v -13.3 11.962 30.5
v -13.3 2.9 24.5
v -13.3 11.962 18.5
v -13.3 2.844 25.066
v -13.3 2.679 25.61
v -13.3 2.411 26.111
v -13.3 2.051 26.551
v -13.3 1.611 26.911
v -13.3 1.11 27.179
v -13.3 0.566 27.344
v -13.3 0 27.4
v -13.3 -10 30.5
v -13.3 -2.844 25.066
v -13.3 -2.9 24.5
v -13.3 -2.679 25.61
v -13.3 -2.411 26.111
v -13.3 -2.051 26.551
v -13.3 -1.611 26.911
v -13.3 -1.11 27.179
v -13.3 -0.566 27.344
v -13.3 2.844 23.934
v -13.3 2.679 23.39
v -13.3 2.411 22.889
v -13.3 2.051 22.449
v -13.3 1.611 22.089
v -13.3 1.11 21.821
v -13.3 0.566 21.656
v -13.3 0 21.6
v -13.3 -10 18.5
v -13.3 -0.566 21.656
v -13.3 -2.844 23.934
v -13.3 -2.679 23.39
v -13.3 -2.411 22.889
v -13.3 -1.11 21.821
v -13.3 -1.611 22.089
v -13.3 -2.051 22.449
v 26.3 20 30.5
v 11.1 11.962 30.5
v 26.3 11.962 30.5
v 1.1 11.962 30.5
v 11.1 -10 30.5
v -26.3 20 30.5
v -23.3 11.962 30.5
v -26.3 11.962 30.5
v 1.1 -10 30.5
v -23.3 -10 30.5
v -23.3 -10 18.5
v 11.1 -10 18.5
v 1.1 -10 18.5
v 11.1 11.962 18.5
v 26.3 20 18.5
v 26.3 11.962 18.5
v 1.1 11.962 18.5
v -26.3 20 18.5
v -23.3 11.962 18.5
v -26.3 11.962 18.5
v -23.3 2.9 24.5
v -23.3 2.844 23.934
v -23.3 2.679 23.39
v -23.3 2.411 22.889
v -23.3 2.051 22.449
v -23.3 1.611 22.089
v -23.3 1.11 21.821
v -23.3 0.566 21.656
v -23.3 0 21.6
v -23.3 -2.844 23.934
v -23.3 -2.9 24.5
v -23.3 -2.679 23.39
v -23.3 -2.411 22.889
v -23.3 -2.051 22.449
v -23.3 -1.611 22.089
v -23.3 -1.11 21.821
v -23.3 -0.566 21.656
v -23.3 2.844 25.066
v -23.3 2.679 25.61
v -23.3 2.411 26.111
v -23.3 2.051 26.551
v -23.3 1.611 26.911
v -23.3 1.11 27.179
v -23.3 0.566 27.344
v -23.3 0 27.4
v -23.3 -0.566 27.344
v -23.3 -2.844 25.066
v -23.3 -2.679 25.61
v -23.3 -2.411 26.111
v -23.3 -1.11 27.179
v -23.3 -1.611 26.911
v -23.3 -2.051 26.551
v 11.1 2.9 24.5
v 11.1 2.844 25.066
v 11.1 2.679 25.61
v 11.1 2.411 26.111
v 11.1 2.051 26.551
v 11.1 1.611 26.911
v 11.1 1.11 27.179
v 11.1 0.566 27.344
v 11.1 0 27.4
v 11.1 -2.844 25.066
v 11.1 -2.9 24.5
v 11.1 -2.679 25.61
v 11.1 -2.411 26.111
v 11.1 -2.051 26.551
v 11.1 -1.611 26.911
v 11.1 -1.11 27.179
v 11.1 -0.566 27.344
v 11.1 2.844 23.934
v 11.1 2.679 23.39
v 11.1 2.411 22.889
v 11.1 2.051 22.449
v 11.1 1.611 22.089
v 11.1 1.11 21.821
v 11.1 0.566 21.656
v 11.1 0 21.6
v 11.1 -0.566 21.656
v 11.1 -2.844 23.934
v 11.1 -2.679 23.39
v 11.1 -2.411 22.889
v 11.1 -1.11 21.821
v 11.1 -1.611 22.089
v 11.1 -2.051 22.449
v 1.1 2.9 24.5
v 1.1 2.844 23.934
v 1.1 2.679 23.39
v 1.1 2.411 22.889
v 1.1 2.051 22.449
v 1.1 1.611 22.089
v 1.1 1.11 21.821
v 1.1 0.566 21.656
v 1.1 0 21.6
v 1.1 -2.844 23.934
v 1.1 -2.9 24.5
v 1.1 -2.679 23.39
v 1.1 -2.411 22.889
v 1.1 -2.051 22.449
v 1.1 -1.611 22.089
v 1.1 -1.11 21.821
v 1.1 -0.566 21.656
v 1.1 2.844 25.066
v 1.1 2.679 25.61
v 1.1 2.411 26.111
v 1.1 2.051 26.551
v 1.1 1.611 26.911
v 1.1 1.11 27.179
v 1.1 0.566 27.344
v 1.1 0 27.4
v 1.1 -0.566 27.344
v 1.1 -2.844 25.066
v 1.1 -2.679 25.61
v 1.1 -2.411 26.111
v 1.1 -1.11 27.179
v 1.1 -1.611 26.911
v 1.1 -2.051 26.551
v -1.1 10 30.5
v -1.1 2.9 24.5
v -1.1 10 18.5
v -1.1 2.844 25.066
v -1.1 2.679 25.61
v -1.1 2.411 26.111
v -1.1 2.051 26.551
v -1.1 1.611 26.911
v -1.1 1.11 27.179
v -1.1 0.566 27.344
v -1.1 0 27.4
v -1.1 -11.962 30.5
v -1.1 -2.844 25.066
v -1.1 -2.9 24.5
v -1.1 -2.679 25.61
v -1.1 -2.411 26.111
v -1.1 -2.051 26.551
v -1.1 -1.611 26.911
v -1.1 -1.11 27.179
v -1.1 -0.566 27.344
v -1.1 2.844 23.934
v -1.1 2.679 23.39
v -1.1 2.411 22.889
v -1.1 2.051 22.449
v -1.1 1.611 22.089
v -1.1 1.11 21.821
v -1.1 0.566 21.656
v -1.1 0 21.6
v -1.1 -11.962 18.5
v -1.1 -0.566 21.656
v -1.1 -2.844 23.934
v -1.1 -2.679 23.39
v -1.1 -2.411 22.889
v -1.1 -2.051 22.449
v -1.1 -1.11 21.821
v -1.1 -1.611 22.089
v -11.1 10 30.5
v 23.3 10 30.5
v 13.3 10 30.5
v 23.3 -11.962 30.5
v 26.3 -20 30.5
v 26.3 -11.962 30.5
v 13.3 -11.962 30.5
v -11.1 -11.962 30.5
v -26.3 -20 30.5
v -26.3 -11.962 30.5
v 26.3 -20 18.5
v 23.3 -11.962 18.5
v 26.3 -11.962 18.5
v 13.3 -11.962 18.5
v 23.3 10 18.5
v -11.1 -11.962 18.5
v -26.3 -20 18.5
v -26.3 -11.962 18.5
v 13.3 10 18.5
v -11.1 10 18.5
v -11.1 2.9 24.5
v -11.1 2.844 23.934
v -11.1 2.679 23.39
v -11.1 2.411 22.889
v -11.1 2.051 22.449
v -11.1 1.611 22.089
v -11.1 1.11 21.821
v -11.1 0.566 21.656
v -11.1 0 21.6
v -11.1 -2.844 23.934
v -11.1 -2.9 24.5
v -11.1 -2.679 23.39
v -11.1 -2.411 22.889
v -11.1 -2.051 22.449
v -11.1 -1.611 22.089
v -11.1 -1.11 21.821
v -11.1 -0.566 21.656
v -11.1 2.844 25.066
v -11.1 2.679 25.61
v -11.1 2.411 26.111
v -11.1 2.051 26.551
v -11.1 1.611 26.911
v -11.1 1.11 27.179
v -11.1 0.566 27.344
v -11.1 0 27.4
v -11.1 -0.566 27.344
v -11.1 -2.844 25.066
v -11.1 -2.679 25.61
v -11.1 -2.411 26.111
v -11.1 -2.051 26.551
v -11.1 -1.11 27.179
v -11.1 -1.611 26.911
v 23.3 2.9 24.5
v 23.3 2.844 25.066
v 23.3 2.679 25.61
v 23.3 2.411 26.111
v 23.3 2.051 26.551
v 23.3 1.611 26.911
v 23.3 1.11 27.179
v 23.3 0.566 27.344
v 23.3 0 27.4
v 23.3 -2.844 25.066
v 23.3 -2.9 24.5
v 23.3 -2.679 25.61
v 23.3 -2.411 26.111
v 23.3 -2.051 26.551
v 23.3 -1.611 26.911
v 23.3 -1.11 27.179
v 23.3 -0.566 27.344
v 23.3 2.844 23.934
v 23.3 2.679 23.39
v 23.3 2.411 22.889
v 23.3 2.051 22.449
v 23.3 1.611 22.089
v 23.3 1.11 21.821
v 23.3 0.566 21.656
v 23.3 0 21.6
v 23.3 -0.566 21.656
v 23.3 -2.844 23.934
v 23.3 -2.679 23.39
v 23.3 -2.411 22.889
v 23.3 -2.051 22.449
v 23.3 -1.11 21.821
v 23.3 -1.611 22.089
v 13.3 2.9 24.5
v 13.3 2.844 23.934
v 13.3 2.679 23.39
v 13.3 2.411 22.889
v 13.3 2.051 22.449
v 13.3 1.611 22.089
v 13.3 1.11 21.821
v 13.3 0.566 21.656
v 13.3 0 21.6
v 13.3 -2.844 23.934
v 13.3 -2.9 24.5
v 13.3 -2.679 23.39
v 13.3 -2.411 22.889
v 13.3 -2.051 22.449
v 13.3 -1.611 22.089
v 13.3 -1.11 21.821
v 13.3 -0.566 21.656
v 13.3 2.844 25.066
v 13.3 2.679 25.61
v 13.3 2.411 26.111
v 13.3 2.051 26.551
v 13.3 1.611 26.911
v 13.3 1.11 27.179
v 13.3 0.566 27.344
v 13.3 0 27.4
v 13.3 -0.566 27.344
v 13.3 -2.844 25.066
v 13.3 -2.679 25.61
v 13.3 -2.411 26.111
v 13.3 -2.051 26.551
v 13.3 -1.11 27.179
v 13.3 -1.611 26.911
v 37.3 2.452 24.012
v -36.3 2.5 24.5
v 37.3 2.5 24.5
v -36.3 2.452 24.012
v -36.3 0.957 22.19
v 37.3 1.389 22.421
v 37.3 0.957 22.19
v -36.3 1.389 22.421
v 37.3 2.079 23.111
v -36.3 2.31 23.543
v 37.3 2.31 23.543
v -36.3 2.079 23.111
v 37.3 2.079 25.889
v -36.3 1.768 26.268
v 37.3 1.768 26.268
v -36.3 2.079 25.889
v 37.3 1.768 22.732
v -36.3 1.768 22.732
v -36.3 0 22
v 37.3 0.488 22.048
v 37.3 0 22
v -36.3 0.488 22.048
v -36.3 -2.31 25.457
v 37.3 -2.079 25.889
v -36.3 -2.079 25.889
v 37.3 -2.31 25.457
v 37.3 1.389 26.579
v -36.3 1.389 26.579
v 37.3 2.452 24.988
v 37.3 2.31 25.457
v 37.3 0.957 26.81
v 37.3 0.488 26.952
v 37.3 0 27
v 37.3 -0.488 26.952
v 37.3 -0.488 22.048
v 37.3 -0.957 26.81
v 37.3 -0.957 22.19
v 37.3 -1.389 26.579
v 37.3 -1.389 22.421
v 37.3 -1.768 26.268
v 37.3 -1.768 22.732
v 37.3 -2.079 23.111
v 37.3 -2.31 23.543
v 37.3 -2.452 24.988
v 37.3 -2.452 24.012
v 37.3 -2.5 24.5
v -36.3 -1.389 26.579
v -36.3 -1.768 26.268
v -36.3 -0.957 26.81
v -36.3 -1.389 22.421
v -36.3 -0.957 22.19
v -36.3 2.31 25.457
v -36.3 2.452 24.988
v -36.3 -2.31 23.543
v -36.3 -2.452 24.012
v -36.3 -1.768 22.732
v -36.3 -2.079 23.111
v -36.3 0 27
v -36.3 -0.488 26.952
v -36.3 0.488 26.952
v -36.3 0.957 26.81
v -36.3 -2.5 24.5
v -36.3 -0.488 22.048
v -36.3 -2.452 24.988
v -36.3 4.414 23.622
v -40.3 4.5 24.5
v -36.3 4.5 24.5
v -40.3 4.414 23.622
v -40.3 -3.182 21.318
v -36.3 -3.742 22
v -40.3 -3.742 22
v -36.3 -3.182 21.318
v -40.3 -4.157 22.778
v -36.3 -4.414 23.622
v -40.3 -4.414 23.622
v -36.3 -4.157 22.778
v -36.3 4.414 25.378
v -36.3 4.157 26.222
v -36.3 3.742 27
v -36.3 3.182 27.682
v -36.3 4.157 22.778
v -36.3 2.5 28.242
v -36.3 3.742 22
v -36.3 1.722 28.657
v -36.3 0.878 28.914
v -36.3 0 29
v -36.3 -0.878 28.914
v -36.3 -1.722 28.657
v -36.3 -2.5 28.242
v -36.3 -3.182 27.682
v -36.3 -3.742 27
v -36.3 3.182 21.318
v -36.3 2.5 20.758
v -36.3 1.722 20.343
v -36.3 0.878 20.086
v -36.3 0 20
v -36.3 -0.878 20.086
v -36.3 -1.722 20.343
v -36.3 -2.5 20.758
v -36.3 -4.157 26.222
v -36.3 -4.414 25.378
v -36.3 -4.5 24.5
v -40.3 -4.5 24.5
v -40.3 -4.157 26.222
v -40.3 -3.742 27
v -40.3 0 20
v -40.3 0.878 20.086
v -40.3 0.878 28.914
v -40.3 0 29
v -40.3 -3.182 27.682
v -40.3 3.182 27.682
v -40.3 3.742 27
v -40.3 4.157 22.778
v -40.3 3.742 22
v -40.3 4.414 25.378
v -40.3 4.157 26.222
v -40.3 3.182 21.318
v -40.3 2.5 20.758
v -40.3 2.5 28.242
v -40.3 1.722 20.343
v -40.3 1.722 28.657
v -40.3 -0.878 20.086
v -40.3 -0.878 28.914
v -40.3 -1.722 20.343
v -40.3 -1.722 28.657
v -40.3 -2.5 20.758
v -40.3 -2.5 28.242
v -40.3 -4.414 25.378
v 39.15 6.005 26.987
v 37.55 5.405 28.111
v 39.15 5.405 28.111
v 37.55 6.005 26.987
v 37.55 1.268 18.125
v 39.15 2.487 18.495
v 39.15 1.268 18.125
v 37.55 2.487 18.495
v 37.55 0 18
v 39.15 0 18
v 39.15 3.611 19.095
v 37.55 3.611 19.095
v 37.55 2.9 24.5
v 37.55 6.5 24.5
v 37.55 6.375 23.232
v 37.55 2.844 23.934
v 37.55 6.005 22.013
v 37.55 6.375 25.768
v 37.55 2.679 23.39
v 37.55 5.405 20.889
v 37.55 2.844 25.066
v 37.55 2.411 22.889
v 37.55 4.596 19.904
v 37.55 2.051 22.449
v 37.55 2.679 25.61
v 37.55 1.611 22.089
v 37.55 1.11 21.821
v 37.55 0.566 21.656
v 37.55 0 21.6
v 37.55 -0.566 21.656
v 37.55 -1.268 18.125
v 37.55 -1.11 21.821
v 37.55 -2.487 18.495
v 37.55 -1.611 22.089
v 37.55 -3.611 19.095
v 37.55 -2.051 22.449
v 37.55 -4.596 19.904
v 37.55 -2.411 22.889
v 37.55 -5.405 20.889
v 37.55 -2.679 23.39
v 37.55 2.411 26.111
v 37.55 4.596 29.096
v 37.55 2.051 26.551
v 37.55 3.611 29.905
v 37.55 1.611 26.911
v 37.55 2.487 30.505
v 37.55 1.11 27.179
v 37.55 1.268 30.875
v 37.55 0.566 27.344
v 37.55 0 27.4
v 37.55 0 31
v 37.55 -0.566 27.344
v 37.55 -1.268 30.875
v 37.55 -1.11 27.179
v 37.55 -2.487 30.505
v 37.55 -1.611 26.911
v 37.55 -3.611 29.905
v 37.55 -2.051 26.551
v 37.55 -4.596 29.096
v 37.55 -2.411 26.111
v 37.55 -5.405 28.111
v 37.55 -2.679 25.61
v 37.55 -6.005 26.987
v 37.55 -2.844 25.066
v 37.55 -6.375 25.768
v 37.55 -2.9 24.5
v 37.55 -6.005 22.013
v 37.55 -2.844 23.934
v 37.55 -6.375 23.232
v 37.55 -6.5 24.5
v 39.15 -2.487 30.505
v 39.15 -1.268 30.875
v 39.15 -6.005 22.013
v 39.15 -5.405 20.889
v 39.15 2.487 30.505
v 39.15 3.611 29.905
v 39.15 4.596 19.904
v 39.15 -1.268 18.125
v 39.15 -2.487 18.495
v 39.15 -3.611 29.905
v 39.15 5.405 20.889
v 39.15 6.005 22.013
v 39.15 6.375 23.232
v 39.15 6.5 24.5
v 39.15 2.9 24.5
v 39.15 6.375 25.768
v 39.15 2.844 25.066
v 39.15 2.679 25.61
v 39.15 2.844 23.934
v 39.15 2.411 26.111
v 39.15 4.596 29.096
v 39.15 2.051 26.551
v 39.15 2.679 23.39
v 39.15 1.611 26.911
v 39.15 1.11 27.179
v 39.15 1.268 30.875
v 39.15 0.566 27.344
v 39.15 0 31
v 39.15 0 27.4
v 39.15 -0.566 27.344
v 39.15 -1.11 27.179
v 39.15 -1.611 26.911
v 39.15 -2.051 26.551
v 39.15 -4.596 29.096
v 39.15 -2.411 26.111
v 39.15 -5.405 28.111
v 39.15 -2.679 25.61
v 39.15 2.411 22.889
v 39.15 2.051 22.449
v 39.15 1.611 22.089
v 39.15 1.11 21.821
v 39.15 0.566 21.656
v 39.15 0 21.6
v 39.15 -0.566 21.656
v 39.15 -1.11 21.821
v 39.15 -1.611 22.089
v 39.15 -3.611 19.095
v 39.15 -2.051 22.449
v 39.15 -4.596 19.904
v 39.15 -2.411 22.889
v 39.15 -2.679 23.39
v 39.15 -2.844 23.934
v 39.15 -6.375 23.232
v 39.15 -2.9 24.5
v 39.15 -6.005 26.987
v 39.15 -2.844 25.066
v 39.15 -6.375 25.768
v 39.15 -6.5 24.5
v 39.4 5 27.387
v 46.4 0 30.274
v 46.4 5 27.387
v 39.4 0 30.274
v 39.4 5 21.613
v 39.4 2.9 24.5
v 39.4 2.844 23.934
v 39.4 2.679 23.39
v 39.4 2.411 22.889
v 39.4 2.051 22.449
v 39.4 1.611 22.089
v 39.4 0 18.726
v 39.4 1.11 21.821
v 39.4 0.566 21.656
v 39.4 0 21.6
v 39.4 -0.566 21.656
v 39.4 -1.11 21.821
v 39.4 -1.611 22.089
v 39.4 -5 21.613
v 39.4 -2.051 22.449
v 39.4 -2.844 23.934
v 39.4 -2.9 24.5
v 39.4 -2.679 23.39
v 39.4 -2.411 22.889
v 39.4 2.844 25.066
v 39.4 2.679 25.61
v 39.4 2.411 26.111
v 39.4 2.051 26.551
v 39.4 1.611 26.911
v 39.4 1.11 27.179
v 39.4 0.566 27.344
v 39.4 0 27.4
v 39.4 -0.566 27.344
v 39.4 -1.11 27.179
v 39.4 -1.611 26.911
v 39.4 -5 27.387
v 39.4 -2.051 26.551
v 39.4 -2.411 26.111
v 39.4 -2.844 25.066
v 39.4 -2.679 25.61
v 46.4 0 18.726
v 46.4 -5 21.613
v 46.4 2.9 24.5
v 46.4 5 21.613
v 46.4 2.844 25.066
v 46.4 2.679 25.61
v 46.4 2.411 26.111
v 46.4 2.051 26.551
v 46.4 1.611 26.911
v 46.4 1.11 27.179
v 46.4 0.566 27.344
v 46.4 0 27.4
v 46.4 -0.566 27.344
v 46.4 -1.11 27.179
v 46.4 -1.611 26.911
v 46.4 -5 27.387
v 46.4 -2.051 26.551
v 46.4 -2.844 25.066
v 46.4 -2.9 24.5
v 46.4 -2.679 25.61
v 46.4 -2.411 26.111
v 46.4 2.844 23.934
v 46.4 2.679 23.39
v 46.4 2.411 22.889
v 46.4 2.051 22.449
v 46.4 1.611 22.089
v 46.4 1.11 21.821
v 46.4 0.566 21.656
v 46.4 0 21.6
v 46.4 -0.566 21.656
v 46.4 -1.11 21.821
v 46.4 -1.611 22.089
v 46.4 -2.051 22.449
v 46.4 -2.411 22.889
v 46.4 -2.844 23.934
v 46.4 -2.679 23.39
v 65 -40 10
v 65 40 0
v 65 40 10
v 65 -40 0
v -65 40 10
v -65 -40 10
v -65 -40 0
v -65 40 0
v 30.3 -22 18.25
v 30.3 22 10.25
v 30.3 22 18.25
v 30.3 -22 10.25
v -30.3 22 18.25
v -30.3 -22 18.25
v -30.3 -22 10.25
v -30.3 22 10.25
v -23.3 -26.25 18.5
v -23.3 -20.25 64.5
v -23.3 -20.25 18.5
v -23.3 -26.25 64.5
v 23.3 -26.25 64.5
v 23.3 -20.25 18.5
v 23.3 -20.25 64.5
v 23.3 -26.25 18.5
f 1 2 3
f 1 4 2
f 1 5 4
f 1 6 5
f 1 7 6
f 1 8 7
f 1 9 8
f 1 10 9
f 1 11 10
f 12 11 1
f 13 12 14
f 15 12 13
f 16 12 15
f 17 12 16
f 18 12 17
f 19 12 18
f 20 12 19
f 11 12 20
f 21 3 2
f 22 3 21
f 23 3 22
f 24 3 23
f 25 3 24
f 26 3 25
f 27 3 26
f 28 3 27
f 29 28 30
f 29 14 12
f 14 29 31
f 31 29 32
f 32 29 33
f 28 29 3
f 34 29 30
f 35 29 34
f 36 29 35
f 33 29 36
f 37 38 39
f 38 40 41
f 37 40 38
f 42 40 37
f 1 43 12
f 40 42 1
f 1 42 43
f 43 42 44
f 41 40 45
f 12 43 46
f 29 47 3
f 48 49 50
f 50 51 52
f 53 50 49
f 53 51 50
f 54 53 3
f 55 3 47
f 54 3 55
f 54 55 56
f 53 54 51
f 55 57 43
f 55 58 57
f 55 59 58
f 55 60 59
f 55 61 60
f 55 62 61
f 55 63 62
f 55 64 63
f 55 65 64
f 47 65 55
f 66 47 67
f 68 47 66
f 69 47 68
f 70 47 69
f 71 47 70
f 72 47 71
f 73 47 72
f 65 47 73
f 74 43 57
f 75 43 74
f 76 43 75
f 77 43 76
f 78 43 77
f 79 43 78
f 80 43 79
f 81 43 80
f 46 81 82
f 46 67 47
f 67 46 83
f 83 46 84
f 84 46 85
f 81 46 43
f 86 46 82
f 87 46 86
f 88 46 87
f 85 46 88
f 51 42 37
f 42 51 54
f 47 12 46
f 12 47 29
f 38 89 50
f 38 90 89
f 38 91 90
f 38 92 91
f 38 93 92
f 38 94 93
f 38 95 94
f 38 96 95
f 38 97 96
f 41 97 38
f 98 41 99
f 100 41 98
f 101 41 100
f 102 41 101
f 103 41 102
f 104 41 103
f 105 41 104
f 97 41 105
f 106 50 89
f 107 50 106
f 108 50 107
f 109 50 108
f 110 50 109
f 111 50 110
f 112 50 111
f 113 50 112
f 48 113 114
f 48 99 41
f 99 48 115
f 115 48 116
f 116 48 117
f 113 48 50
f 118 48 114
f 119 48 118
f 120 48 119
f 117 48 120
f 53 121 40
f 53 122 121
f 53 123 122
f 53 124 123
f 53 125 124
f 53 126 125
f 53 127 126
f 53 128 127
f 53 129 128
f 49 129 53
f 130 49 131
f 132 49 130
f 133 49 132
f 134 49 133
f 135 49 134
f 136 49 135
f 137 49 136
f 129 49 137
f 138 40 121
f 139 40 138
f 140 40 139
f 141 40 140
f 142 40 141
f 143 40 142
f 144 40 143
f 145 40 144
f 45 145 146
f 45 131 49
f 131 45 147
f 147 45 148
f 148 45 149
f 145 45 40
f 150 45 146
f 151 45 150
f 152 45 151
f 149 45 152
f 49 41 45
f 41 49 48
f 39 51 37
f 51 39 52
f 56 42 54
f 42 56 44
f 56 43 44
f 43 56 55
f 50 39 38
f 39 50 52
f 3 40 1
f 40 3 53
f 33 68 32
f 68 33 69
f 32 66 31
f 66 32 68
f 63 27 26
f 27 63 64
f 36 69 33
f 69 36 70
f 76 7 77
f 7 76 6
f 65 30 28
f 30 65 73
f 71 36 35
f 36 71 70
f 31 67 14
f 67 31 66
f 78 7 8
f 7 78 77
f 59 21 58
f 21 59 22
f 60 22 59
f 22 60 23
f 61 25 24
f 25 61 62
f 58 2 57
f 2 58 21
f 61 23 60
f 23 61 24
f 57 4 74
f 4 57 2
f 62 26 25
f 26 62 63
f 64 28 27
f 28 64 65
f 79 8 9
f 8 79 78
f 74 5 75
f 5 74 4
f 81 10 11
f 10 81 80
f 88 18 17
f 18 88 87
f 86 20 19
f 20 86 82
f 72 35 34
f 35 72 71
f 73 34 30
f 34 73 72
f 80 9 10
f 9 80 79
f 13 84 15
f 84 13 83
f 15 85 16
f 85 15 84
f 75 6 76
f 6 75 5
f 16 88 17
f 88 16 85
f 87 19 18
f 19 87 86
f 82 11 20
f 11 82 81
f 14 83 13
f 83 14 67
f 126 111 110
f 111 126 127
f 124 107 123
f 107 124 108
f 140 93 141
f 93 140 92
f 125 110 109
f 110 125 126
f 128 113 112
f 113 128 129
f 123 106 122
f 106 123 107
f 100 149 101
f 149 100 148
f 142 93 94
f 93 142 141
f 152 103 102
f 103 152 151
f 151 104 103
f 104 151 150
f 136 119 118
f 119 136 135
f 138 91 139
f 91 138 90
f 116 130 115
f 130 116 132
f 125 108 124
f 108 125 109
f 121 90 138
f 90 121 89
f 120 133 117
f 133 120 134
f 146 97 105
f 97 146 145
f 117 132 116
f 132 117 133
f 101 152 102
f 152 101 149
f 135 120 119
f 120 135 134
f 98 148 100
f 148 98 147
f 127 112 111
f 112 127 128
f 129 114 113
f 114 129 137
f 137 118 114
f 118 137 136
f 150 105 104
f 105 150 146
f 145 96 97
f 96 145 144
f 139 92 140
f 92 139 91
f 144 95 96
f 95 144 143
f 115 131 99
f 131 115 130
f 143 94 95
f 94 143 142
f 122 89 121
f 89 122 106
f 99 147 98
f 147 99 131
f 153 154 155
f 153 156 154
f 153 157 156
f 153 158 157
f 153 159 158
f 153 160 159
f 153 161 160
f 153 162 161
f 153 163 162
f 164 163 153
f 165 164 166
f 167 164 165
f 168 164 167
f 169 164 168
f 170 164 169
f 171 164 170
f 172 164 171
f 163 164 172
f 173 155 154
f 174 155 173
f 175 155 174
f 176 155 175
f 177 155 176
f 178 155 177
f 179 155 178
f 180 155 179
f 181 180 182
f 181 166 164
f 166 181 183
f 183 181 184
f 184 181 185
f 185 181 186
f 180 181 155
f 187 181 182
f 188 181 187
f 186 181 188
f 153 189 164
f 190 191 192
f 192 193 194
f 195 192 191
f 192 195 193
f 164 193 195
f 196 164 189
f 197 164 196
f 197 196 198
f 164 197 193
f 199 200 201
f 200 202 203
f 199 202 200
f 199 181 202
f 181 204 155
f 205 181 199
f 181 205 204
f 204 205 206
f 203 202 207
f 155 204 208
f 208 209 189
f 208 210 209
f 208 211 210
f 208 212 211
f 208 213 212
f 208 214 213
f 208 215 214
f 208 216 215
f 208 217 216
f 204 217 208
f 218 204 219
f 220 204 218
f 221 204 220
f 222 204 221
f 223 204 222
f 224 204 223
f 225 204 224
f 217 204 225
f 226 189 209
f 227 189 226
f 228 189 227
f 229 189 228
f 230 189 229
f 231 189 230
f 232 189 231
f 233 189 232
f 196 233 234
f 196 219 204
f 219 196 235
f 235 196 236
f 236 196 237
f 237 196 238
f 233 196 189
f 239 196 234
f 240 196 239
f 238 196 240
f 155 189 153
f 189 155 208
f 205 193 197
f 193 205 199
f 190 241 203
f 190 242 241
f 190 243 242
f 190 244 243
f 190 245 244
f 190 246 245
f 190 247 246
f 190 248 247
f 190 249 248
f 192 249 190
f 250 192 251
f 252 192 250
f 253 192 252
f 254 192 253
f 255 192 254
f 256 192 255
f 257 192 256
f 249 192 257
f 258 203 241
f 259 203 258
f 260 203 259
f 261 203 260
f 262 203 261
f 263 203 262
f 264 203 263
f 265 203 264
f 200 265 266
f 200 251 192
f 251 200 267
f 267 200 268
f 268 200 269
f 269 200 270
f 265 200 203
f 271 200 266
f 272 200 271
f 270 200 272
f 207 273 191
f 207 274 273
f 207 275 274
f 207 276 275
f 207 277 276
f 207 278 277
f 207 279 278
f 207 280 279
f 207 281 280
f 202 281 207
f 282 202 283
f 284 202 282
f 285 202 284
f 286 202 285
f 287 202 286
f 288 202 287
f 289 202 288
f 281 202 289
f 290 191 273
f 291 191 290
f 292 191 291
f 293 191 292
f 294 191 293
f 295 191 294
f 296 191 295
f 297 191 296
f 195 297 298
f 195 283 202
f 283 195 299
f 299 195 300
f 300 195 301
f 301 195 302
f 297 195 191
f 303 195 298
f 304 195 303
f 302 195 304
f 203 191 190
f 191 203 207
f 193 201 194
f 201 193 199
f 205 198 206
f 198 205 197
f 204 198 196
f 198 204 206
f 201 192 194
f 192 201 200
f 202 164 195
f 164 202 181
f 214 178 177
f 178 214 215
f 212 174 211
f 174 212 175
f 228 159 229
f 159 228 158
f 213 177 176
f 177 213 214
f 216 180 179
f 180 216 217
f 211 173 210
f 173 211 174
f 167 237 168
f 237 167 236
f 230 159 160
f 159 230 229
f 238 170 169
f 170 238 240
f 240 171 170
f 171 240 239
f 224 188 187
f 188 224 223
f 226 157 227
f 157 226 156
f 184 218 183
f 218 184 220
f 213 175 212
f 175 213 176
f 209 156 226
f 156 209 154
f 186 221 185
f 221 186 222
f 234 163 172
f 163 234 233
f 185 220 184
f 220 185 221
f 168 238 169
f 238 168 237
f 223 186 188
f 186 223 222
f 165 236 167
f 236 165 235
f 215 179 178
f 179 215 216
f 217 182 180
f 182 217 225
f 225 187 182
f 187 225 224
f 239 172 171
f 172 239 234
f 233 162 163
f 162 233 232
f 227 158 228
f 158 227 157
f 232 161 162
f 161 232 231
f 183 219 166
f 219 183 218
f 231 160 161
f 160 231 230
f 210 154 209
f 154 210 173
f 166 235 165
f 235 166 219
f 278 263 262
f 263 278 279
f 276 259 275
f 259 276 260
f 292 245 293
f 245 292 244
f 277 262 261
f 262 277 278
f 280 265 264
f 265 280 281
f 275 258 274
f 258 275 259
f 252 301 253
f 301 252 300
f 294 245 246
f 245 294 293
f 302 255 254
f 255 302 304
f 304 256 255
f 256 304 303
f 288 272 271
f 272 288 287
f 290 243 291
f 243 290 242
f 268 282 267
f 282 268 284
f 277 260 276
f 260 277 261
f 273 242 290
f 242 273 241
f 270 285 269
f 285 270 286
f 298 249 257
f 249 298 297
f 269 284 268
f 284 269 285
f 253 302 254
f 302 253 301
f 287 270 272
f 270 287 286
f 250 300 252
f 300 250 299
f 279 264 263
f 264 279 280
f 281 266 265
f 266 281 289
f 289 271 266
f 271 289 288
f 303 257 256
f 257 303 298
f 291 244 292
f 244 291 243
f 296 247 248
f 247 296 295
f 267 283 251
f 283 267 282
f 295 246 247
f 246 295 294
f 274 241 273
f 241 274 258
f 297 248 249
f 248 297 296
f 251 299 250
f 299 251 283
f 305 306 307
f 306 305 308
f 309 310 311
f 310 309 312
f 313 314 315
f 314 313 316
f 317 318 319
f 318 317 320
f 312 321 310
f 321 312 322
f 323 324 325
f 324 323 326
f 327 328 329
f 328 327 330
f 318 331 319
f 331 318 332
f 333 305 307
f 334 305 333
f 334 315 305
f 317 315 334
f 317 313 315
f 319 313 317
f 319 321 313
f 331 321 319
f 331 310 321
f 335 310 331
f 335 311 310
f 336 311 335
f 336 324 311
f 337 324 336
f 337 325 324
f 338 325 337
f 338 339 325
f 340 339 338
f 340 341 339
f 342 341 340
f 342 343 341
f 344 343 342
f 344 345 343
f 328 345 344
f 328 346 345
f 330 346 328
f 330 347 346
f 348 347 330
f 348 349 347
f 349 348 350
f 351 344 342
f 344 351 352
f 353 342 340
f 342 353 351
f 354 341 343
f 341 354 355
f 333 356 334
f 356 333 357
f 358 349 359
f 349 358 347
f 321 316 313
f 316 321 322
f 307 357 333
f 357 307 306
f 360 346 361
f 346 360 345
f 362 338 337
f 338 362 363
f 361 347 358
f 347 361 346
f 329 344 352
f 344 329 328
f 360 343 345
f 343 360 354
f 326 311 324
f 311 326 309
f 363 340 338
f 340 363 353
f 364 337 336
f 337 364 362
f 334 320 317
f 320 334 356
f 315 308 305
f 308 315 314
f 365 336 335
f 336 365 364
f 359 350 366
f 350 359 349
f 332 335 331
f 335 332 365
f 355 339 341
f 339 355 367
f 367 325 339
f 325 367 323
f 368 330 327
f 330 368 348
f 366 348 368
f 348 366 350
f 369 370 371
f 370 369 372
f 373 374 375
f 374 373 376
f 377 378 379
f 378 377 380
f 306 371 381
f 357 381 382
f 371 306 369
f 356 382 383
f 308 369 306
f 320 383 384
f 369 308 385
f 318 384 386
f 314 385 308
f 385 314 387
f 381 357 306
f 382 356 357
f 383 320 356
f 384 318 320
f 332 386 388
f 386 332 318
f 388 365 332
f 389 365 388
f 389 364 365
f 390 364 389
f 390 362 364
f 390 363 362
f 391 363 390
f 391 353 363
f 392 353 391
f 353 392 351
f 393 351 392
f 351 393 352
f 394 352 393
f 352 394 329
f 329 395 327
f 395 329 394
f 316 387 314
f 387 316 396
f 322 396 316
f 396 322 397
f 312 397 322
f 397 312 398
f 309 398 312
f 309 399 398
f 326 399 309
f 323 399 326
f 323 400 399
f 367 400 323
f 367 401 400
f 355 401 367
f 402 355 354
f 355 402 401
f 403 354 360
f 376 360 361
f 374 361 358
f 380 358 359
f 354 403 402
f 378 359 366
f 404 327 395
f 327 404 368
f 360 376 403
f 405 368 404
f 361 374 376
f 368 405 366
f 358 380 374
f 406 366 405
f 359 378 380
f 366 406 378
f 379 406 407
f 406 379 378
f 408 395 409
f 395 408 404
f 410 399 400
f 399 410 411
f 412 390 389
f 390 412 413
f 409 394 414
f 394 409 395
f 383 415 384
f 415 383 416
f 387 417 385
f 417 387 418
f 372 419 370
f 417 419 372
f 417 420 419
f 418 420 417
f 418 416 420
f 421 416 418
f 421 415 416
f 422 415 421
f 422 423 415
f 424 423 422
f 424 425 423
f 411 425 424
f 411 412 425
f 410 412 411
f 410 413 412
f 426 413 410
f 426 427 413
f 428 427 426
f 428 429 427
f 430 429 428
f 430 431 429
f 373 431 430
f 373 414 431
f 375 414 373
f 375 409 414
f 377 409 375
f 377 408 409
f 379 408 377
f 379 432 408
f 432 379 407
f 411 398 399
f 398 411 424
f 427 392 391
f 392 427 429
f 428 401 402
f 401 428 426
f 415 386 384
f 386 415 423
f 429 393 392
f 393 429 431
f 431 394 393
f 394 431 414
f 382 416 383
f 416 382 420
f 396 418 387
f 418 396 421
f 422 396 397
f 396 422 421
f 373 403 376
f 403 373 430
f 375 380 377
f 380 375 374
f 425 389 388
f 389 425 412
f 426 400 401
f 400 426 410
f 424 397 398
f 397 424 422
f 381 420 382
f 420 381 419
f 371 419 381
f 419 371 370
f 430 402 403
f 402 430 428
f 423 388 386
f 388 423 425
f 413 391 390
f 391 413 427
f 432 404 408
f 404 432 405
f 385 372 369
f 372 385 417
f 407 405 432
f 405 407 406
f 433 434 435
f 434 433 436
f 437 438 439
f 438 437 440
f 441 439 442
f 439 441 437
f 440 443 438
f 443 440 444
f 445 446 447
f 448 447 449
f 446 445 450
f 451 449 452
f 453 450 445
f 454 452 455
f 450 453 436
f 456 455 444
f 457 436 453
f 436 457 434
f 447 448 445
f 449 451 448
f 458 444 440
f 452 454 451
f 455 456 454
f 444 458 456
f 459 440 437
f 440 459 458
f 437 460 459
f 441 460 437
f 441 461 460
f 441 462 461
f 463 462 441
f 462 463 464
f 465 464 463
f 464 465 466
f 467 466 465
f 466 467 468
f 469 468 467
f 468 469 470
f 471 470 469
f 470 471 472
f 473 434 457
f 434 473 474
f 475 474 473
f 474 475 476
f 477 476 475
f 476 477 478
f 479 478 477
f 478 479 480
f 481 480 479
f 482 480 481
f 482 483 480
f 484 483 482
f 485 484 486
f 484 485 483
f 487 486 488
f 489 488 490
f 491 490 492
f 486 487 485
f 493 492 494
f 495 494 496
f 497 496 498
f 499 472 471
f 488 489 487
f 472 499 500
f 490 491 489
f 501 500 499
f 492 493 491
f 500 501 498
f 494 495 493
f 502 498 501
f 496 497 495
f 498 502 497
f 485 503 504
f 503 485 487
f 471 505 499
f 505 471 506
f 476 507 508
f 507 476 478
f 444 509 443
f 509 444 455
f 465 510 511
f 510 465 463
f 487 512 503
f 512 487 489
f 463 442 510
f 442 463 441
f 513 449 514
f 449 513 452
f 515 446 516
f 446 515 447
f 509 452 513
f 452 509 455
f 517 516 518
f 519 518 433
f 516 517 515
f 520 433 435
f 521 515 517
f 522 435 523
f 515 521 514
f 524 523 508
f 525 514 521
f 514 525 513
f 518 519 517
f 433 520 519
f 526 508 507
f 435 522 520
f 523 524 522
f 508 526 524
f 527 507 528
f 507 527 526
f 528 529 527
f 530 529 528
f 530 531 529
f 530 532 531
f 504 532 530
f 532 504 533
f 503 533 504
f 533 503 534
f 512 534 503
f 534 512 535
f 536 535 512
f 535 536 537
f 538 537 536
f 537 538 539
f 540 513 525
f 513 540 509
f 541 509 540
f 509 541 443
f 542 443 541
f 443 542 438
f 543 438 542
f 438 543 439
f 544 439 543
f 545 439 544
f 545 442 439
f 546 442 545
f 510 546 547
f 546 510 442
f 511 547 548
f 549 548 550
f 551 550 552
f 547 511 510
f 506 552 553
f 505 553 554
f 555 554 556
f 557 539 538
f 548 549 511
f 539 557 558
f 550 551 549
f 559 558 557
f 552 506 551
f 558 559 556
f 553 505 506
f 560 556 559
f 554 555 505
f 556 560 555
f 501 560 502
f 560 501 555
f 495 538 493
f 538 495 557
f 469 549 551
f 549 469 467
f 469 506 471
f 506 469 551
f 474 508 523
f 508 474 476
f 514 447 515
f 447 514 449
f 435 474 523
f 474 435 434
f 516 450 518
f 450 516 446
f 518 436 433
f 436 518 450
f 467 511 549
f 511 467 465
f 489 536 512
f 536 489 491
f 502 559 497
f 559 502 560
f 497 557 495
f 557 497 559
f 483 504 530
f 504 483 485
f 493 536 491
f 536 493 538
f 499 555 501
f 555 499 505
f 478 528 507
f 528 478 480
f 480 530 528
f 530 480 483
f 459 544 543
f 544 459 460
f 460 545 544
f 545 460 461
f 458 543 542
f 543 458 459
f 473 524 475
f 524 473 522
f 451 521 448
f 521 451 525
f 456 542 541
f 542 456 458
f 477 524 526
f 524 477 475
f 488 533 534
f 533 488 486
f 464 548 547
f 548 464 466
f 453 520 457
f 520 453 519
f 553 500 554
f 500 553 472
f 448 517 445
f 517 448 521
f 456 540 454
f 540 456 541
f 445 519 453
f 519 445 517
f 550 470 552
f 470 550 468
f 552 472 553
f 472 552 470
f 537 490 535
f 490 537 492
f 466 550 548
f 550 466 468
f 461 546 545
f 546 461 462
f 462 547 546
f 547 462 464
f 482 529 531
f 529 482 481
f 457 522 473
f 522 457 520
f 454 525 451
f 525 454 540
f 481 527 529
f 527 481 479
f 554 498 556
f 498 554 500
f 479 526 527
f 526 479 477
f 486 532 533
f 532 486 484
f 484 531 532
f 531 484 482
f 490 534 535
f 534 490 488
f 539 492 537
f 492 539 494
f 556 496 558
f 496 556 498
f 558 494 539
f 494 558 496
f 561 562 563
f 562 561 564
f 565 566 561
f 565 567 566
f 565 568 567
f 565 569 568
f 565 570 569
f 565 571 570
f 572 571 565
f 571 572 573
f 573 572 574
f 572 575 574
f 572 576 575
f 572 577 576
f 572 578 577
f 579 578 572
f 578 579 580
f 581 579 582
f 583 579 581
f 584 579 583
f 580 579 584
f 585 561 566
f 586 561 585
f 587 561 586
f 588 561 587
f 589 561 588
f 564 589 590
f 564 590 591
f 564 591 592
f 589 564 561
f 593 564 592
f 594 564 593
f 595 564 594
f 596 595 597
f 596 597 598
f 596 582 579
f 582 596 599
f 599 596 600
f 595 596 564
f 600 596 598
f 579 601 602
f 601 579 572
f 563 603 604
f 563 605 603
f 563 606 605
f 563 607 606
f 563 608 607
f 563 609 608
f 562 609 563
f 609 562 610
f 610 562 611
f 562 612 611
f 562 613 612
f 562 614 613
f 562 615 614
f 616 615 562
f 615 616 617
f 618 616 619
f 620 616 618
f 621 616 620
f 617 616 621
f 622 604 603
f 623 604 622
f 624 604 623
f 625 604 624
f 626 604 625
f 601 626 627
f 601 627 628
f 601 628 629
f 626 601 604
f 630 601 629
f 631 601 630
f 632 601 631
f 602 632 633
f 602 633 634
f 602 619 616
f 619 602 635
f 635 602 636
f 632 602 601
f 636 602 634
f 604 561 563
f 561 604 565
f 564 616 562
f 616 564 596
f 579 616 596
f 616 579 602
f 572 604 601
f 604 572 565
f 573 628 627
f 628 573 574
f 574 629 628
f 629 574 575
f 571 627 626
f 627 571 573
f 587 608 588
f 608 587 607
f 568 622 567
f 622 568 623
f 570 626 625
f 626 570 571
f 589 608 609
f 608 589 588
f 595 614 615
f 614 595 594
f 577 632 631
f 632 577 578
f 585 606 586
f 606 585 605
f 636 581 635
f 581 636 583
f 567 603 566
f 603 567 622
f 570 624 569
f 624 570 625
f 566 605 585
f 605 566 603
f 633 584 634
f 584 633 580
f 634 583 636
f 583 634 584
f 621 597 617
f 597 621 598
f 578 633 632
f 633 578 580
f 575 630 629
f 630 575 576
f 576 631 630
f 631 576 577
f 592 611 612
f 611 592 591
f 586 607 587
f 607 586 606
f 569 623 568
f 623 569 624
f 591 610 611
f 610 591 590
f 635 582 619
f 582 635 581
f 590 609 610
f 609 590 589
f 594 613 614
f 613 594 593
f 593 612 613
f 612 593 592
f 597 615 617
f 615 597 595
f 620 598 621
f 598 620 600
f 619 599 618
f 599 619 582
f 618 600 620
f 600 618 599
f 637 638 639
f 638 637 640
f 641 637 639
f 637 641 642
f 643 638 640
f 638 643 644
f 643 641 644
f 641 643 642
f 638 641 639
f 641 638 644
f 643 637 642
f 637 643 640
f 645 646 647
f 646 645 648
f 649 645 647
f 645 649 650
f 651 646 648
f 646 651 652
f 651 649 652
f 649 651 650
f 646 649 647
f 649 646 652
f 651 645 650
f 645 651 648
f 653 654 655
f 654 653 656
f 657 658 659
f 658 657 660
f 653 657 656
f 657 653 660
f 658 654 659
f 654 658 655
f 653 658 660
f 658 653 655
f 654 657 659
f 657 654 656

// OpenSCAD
$fn = 32;

// ------------------------------------------------------------------------
// Comb hinge with flap: leaf 52.6 x 20 mm, pin d5, flap 46 mm
// Every part is its own module, assembly() places every instance.
// ------------------------------------------------------------------------

// --- part 1 ---
module hinge_bed() {
  difference() {
    translate([-65, -40, 0]) cube([130, 80, 10]);
  }
}

// --- part 2 ---
module hinge_riser() {
  difference() {
    translate([-30.3, -22, 0]) cube([60.6, 44, 8]);
  }
}

// --- part 3 ---
module hinge_leaf_a() {
  difference() {
    union() {
      translate([-23.3, -10, -6]) cube([10, 30, 12]);
      translate([1.1, -10, -6]) cube([10, 30, 12]);
      translate([-26.3, 11.962, -6]) cube([52.6, 8.038, 12]);
    }
    translate([-18.3, 0, 0]) rotate([0, 90, 0]) cylinder(h = 12, d = 5.8, center = true);
    translate([6.1, 0, 0]) rotate([0, 90, 0]) cylinder(h = 12, d = 5.8, center = true);
  }
}

// --- part 4 ---
module hinge_leaf_b() {
  difference() {
    union() {
      translate([-11.1, -20, -6]) cube([10, 30, 12]);
      translate([13.3, -20, -6]) cube([10, 30, 12]);
      translate([-26.3, -20, -6]) cube([52.6, 8.038, 12]);
    }
    translate([-6.1, 0, 0]) rotate([0, 90, 0]) cylinder(h = 12, d = 5.8, center = true);
    translate([18.3, 0, 0]) rotate([0, 90, 0]) cylinder(h = 12, d = 5.8, center = true);
  }
}

// --- part 5 ---
module hinge_flap() {
  difference() {
    translate([-23.3, -23, 0]) cube([46.6, 46, 6]);
  }
}

// --- part 6 ---
module hinge_pin() {
  rotate([0, 90, 0]) cylinder(h = 74.6, d = 5, center = true);
  translate([-40.3, 0, 0]) rotate([0, 90, 0]) cylinder(h = 4, d = 9);
}

// --- part 7 ---
module pin_washer() {
  difference() {
      translate([0, 0, 0]) cylinder(h = 1.6, d = 13);
      translate([0, 0, -1]) cylinder(h = 3.6, d = 5.8);
    }
}

// --- part 8 ---
module pin_nut() {
  difference() {
    linear_extrude(height = 7) polygon(points = [[5.774, 0], [2.887, 5], [-2.887, 5], [-5.774, 0], [-2.887, -5], [2.887, -5]]);
    translate([0, 0, -1]) cylinder(h = 9, d = 5.8);
  }
}

// --- assembly ---
module assembly() {
  color([0.80, 0.24, 0.20]) translate([0, 0, 0]) rotate([0, 0, 0]) hinge_bed();
  color([0.20, 0.45, 0.75]) translate([0, 0, 10.25]) rotate([0, 0, 0]) hinge_riser();
  color([0.25, 0.62, 0.32]) translate([0, 0, 24.5]) rotate([0, 0, 0]) hinge_leaf_a();
  color([0.92, 0.70, 0.18]) translate([0, 0, 24.5]) rotate([0, 0, 0]) hinge_leaf_b();
  color([0.58, 0.35, 0.70]) translate([0, -20.25, 41.5]) rotate([90, 0, 0]) hinge_flap();
  color([0.16, 0.66, 0.66]) translate([0, 0, 24.5]) rotate([0, 0, 0]) hinge_pin();
  color([0.85, 0.48, 0.18]) translate([37.55, 0, 24.5]) rotate([0, 90, 0]) pin_washer();
  color([0.55, 0.60, 0.65]) translate([39.4, 0, 24.5]) rotate([0, 90, 0]) pin_nut();
}

assembly();
